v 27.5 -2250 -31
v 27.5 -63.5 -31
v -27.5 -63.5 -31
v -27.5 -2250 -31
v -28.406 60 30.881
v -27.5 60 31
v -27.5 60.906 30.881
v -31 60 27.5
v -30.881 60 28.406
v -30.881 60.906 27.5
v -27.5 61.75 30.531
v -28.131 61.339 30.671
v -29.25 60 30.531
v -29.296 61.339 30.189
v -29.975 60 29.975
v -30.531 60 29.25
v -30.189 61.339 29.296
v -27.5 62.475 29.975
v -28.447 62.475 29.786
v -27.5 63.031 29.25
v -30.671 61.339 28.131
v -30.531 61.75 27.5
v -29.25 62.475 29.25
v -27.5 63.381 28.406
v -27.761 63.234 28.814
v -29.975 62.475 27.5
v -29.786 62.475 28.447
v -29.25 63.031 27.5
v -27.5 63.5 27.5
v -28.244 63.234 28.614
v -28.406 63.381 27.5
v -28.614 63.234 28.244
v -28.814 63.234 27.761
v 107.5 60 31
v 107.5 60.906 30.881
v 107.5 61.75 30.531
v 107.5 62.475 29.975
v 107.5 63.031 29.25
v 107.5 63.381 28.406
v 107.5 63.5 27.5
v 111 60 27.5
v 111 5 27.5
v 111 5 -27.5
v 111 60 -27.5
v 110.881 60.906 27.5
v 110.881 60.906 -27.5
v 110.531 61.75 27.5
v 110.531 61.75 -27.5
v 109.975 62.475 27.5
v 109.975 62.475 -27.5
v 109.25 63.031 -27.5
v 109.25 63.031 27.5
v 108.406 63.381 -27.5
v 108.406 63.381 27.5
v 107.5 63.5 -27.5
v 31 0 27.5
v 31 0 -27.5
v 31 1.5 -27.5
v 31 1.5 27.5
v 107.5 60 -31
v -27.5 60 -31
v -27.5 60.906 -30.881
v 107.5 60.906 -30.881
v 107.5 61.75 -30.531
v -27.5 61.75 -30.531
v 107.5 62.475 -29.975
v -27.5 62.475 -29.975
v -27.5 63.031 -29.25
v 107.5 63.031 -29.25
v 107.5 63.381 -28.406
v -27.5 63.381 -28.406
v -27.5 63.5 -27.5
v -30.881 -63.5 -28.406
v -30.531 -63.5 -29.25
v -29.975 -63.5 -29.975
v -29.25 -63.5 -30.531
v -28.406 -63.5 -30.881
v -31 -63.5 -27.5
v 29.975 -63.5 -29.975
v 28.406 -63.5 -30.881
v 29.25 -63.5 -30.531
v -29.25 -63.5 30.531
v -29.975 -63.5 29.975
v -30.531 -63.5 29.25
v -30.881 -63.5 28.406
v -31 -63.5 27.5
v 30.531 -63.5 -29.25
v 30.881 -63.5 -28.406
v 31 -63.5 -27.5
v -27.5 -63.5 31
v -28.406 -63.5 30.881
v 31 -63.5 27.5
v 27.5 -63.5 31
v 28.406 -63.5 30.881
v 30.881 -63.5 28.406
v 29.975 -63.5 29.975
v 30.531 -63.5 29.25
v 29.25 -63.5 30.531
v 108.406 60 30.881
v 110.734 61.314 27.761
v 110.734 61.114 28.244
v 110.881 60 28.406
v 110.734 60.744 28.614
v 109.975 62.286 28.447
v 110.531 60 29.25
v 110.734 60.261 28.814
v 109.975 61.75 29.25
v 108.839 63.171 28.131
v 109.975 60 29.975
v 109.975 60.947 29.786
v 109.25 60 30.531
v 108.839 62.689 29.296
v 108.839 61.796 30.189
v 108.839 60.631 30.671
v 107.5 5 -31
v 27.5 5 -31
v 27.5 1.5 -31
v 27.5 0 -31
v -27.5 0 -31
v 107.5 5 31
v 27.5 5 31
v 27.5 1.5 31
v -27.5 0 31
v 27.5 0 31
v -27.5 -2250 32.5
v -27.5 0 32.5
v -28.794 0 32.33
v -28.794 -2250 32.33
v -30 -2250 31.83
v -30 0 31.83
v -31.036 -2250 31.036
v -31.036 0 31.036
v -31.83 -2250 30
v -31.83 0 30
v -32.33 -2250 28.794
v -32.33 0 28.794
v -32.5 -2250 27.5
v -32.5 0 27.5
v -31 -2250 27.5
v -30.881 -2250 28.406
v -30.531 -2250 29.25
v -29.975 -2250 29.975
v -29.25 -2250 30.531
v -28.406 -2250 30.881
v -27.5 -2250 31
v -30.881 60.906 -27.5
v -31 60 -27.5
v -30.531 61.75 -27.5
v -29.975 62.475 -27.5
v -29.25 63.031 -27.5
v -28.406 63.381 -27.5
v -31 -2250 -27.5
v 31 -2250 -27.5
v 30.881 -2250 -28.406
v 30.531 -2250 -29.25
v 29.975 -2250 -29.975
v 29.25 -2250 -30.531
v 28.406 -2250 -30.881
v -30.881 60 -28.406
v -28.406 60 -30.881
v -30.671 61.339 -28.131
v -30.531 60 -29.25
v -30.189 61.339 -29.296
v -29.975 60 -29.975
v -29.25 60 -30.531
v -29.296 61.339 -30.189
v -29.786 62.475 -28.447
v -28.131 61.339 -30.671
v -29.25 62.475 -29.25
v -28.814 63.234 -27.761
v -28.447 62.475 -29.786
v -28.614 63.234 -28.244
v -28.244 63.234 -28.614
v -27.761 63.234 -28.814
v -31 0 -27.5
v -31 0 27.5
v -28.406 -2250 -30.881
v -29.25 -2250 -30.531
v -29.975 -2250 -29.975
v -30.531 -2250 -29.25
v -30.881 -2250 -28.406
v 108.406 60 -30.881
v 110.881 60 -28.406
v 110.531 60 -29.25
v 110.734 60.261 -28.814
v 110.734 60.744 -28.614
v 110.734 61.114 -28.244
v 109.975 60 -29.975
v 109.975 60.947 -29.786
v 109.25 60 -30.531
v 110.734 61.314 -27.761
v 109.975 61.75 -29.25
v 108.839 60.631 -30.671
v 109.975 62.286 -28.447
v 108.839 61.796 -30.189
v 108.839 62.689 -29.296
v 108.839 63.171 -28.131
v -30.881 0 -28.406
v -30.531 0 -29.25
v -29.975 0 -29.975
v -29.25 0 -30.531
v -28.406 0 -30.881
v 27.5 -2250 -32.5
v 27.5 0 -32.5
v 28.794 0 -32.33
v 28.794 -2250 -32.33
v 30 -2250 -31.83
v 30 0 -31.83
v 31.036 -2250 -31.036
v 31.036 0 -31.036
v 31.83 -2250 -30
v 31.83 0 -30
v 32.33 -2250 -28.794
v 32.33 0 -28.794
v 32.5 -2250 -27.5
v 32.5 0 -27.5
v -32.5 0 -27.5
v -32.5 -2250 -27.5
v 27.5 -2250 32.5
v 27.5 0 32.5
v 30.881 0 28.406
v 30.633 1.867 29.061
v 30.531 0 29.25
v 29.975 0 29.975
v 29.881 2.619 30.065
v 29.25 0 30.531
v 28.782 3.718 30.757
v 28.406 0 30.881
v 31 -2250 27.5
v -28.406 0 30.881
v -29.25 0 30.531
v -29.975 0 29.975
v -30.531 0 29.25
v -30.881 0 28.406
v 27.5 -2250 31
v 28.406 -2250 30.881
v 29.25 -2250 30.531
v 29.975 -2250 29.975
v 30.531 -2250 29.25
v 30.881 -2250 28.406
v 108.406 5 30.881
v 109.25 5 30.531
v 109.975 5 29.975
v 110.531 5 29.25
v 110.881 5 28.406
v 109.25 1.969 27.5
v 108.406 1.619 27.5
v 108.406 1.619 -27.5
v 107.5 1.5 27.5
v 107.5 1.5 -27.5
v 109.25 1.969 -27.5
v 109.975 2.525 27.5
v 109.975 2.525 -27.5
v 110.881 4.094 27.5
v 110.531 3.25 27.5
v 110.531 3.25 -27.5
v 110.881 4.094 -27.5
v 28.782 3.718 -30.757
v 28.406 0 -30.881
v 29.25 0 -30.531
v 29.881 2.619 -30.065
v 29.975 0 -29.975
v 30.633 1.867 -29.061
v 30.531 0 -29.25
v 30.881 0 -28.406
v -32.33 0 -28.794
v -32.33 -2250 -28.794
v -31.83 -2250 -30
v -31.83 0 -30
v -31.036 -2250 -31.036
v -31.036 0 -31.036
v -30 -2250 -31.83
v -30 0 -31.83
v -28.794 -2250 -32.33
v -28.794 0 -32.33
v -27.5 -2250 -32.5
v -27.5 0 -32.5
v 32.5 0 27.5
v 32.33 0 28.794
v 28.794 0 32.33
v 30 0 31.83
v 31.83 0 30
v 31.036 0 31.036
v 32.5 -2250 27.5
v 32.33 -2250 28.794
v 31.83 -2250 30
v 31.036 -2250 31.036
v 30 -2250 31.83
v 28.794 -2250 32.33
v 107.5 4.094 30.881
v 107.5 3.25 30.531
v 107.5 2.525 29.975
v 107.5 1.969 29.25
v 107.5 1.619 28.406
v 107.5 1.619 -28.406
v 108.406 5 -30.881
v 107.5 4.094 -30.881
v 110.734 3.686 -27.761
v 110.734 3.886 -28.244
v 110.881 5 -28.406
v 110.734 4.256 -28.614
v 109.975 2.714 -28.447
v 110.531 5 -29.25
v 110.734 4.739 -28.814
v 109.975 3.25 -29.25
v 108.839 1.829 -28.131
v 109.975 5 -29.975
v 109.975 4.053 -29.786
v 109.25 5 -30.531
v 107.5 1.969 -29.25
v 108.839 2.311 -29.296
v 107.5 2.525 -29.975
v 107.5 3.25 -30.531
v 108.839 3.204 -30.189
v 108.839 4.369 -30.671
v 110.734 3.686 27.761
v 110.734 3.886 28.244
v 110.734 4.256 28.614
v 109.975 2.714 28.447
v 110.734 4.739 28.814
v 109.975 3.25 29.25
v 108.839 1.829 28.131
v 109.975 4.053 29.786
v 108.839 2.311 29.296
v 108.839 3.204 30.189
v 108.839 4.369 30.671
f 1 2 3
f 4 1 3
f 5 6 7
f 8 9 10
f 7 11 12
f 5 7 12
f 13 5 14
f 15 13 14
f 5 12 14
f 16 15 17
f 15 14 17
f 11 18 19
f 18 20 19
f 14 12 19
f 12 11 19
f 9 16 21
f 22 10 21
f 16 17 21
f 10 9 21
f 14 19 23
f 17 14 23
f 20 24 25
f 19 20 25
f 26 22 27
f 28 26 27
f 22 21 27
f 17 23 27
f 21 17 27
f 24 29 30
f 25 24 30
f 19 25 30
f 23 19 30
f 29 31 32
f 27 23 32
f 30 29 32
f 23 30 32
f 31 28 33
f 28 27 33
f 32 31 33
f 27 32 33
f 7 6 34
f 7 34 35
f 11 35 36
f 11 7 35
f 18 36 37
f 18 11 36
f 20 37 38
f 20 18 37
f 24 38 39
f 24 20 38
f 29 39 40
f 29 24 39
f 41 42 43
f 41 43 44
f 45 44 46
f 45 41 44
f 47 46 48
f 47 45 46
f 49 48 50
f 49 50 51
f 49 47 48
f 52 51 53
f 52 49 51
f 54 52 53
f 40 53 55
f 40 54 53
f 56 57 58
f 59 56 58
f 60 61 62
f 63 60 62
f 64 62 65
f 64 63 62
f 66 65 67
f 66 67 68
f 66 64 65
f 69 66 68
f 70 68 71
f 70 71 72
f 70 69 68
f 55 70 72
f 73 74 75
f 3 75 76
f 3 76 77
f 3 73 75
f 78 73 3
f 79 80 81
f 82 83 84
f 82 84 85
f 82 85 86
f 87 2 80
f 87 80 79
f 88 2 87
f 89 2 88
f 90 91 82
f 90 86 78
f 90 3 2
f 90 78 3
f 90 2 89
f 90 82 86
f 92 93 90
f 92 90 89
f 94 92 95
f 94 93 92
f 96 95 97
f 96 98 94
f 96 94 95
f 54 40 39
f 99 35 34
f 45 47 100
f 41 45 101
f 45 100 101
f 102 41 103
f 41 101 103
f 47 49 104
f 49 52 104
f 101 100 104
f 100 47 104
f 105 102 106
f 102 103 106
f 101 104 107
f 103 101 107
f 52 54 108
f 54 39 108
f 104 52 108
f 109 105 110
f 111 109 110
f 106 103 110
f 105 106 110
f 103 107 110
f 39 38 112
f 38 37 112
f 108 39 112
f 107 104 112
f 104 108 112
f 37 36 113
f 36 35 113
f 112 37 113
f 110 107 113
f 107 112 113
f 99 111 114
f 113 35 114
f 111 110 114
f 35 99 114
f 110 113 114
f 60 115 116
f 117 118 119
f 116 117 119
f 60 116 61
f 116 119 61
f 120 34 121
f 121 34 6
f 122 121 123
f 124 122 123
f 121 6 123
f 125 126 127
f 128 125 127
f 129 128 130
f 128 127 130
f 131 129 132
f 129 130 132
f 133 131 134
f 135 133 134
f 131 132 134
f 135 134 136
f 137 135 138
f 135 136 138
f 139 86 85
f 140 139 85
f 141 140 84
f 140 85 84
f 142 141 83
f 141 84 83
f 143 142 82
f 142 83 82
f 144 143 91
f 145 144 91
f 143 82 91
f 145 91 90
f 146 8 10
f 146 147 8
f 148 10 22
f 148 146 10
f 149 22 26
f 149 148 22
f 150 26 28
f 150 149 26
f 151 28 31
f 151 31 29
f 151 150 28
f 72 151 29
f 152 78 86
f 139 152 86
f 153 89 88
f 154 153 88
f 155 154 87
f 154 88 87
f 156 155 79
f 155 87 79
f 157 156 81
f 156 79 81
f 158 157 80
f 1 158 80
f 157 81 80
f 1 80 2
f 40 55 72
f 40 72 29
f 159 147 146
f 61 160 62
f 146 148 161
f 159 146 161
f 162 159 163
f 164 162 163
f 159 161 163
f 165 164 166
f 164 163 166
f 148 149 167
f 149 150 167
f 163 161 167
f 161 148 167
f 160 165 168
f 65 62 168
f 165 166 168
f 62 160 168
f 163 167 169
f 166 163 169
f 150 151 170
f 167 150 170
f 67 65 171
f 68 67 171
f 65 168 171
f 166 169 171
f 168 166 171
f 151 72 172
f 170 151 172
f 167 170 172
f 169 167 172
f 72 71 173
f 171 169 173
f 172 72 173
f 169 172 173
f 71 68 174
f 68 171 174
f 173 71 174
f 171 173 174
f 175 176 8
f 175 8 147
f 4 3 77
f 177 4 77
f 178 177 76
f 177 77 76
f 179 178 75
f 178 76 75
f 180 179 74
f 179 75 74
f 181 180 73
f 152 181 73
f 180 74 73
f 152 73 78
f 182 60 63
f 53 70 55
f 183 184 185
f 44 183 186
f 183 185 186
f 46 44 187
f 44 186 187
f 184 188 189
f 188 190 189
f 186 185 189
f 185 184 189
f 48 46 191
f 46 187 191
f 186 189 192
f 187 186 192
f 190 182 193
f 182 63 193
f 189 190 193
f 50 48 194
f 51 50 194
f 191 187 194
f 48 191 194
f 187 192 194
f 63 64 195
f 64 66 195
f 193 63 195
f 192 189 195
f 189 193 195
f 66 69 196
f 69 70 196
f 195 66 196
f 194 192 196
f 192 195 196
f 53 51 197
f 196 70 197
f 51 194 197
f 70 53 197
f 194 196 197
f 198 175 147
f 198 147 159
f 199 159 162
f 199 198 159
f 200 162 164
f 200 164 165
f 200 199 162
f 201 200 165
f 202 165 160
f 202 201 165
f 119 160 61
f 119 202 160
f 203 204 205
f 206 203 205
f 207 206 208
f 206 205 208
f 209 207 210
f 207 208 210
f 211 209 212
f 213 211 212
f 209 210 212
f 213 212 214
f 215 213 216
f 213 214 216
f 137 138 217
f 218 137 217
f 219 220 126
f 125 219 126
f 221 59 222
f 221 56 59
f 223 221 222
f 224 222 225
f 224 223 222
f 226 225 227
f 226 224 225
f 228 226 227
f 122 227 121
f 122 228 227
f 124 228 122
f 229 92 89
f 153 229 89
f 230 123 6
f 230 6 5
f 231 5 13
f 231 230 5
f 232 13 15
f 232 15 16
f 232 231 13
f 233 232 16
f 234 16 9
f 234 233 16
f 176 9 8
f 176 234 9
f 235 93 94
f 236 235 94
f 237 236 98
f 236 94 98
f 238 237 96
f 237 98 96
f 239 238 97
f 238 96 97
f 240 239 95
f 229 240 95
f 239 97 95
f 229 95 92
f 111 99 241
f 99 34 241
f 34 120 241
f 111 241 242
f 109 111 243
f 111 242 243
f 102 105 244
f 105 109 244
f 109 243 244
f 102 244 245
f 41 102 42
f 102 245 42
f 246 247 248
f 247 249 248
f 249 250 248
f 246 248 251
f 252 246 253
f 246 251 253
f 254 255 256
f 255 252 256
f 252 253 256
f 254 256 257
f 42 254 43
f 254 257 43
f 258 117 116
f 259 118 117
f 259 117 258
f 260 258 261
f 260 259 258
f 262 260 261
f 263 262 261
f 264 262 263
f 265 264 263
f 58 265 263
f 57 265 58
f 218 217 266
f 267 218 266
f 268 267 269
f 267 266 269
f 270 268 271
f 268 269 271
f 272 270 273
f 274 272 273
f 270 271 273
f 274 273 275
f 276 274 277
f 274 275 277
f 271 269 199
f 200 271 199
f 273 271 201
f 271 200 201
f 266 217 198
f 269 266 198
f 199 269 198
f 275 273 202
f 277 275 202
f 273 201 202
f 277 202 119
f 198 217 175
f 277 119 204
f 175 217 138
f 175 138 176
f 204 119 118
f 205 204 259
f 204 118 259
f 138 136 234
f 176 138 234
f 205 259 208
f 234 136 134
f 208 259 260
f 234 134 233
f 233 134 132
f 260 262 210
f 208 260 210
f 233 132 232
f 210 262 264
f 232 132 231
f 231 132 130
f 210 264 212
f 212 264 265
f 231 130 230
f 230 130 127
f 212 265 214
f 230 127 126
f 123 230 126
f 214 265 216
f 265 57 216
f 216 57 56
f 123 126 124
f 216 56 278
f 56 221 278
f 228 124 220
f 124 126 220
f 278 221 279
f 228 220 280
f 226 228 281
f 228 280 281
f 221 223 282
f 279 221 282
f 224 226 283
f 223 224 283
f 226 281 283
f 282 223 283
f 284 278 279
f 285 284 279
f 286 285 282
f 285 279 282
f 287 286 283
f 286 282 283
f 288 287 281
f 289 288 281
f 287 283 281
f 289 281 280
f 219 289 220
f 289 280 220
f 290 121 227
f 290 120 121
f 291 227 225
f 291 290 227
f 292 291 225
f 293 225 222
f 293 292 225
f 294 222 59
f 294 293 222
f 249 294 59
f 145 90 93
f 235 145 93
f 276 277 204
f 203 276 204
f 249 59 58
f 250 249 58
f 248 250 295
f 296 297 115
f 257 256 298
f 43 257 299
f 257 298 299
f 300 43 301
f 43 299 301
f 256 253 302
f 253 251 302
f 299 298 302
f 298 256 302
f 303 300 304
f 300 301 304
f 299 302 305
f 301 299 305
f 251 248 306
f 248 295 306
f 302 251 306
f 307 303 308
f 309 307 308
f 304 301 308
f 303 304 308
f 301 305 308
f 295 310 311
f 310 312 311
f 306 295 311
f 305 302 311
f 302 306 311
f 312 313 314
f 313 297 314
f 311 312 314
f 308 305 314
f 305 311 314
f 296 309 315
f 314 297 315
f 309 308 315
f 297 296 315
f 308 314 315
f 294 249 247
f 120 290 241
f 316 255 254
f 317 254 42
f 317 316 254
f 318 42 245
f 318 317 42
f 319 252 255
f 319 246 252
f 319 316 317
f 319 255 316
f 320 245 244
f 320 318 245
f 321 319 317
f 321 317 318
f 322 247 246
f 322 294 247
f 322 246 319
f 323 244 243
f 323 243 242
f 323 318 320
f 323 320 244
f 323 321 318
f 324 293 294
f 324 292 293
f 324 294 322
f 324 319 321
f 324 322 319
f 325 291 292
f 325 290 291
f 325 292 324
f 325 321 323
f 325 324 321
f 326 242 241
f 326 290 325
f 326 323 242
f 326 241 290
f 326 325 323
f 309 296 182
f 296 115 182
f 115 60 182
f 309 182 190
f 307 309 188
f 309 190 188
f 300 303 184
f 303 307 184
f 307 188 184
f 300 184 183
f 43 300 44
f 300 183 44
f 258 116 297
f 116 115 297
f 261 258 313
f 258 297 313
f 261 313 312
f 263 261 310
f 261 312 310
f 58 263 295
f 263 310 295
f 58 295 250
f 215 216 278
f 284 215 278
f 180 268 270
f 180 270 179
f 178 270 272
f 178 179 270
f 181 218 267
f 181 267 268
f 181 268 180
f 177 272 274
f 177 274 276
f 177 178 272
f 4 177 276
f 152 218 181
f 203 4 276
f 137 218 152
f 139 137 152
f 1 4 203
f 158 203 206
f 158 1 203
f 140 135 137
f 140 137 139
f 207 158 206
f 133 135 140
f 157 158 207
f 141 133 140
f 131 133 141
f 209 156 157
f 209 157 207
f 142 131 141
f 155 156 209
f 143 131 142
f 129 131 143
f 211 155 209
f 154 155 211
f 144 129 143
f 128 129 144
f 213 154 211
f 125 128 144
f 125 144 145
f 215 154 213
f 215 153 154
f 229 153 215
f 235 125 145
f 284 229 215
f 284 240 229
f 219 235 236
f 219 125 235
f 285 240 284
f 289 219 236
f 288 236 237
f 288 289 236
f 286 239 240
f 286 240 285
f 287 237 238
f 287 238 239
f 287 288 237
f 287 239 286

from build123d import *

# Parameters (mm, degrees)
F3_DEPTH = 2250
F4_DEPTH = 63.5
F5_W     = 62
F5_H     = 3.5
F5_H_2   = 27.5
F6_DEPTH = 25
F8_DEPTH = 80
F9_R     = 3.5


with BuildPart() as f3:
    # F2 (on Front) → F3 (new body)
    with BuildSketch(Plane.XZ):
        with BuildLine():
            ThreePointArc((32.5, 27.5), (31.0355339059, 31.0355339059), (27.5, 32.5))
            Line((27.5, 32.5), (-27.5, 32.5))
            ThreePointArc((-27.5, 32.5), (-31.0355339059, 31.0355339059), (-32.5, 27.5))
            Line((-32.5, 27.5), (-32.5, -27.5))
            ThreePointArc((-32.5, -27.5), (-31.0355339059, -31.0355339059), (-27.5, -32.5))
            Line((-27.5, -32.5), (27.5, -32.5))
            ThreePointArc((27.5, -32.5), (31.0355339059, -31.0355339059), (32.5, -27.5))
            Line((32.5, -27.5), (32.5, 27.5))
        make_face()
        with BuildLine():
            ThreePointArc((27.5, 31), (29.9748737342, 29.9748737342), (31, 27.5))
            Line((31, 27.5), (31, -27.5))
            ThreePointArc((31, -27.5), (29.9748737342, -29.9748737342), (27.5, -31))
            Line((27.5, -31), (-27.5, -31))
            ThreePointArc((-27.5, -31), (-29.9748737342, -29.9748737342), (-31, -27.5))
            Line((-31, -27.5), (-31, 27.5))
            ThreePointArc((-31, 27.5), (-29.9748737342, 29.9748737342), (-27.5, 31))
            Line((-27.5, 31), (27.5, 31))
        make_face(mode=Mode.SUBTRACT)
    extrude(amount=F3_DEPTH)

    # F2 (on Front) → F4 (join, symmetric)
    with BuildSketch(Plane.XZ):
        with BuildLine():
            Line((31, -27.5), (31, 27.5))
            ThreePointArc((31, 27.5), (29.9748737342, 29.9748737342), (27.5, 31))
            Line((27.5, 31), (-27.5, 31))
            ThreePointArc((-27.5, 31), (-29.9748737342, 29.9748737342), (-31, 27.5))
            Line((-31, 27.5), (-31, -27.5))
            ThreePointArc((-31, -27.5), (-29.9748737342, -29.9748737342), (-27.5, -31))
            Line((-27.5, -31), (27.5, -31))
            ThreePointArc((27.5, -31), (29.9748737342, -29.9748737342), (31, -27.5))
        make_face()
    extrude(amount=F4_DEPTH, both=True)

    # F5 (on face) → F6 (join)
    with BuildSketch(Plane.YZ.offset(31)):
        with Locations((32.5, 29.25)):
            Rectangle(F5_W, F5_H)
        with Locations((32.5, 13.75)):
            Rectangle(F5_W, F5_H_2)
        with Locations((32.5, -13.75)):
            Rectangle(F5_W, F5_H_2)
        with Locations((32.5, -29.25)):
            Rectangle(F5_W, F5_H)
    extrude(amount=-F6_DEPTH)

    # F7 (on face) → F8 (join)
    with BuildSketch(Plane.YZ.offset(31)):
        Polygon((63.5, 31), (1.5, 31), (1.5, 27.5), (1.5, -27.5), (1.5, -31), (63.5, -31), align=None)
    extrude(amount=F8_DEPTH)

    # F9
    f9_edges = [f3.edges().sort_by_distance(p)[0] for p in [
        (41.75, 63.5, 31),
        (69.25, 1.5, 31),
        (69.25, 1.5, -31),
        (111, 1.5, 0),
        (111, 32.5, -31),
        (111, 63.5, 0),
        (111, 32.5, 31),
        (41.75, 63.5, -31),
    ]]
    fillet(f9_edges, radius=F9_R)


solid = f3.part
